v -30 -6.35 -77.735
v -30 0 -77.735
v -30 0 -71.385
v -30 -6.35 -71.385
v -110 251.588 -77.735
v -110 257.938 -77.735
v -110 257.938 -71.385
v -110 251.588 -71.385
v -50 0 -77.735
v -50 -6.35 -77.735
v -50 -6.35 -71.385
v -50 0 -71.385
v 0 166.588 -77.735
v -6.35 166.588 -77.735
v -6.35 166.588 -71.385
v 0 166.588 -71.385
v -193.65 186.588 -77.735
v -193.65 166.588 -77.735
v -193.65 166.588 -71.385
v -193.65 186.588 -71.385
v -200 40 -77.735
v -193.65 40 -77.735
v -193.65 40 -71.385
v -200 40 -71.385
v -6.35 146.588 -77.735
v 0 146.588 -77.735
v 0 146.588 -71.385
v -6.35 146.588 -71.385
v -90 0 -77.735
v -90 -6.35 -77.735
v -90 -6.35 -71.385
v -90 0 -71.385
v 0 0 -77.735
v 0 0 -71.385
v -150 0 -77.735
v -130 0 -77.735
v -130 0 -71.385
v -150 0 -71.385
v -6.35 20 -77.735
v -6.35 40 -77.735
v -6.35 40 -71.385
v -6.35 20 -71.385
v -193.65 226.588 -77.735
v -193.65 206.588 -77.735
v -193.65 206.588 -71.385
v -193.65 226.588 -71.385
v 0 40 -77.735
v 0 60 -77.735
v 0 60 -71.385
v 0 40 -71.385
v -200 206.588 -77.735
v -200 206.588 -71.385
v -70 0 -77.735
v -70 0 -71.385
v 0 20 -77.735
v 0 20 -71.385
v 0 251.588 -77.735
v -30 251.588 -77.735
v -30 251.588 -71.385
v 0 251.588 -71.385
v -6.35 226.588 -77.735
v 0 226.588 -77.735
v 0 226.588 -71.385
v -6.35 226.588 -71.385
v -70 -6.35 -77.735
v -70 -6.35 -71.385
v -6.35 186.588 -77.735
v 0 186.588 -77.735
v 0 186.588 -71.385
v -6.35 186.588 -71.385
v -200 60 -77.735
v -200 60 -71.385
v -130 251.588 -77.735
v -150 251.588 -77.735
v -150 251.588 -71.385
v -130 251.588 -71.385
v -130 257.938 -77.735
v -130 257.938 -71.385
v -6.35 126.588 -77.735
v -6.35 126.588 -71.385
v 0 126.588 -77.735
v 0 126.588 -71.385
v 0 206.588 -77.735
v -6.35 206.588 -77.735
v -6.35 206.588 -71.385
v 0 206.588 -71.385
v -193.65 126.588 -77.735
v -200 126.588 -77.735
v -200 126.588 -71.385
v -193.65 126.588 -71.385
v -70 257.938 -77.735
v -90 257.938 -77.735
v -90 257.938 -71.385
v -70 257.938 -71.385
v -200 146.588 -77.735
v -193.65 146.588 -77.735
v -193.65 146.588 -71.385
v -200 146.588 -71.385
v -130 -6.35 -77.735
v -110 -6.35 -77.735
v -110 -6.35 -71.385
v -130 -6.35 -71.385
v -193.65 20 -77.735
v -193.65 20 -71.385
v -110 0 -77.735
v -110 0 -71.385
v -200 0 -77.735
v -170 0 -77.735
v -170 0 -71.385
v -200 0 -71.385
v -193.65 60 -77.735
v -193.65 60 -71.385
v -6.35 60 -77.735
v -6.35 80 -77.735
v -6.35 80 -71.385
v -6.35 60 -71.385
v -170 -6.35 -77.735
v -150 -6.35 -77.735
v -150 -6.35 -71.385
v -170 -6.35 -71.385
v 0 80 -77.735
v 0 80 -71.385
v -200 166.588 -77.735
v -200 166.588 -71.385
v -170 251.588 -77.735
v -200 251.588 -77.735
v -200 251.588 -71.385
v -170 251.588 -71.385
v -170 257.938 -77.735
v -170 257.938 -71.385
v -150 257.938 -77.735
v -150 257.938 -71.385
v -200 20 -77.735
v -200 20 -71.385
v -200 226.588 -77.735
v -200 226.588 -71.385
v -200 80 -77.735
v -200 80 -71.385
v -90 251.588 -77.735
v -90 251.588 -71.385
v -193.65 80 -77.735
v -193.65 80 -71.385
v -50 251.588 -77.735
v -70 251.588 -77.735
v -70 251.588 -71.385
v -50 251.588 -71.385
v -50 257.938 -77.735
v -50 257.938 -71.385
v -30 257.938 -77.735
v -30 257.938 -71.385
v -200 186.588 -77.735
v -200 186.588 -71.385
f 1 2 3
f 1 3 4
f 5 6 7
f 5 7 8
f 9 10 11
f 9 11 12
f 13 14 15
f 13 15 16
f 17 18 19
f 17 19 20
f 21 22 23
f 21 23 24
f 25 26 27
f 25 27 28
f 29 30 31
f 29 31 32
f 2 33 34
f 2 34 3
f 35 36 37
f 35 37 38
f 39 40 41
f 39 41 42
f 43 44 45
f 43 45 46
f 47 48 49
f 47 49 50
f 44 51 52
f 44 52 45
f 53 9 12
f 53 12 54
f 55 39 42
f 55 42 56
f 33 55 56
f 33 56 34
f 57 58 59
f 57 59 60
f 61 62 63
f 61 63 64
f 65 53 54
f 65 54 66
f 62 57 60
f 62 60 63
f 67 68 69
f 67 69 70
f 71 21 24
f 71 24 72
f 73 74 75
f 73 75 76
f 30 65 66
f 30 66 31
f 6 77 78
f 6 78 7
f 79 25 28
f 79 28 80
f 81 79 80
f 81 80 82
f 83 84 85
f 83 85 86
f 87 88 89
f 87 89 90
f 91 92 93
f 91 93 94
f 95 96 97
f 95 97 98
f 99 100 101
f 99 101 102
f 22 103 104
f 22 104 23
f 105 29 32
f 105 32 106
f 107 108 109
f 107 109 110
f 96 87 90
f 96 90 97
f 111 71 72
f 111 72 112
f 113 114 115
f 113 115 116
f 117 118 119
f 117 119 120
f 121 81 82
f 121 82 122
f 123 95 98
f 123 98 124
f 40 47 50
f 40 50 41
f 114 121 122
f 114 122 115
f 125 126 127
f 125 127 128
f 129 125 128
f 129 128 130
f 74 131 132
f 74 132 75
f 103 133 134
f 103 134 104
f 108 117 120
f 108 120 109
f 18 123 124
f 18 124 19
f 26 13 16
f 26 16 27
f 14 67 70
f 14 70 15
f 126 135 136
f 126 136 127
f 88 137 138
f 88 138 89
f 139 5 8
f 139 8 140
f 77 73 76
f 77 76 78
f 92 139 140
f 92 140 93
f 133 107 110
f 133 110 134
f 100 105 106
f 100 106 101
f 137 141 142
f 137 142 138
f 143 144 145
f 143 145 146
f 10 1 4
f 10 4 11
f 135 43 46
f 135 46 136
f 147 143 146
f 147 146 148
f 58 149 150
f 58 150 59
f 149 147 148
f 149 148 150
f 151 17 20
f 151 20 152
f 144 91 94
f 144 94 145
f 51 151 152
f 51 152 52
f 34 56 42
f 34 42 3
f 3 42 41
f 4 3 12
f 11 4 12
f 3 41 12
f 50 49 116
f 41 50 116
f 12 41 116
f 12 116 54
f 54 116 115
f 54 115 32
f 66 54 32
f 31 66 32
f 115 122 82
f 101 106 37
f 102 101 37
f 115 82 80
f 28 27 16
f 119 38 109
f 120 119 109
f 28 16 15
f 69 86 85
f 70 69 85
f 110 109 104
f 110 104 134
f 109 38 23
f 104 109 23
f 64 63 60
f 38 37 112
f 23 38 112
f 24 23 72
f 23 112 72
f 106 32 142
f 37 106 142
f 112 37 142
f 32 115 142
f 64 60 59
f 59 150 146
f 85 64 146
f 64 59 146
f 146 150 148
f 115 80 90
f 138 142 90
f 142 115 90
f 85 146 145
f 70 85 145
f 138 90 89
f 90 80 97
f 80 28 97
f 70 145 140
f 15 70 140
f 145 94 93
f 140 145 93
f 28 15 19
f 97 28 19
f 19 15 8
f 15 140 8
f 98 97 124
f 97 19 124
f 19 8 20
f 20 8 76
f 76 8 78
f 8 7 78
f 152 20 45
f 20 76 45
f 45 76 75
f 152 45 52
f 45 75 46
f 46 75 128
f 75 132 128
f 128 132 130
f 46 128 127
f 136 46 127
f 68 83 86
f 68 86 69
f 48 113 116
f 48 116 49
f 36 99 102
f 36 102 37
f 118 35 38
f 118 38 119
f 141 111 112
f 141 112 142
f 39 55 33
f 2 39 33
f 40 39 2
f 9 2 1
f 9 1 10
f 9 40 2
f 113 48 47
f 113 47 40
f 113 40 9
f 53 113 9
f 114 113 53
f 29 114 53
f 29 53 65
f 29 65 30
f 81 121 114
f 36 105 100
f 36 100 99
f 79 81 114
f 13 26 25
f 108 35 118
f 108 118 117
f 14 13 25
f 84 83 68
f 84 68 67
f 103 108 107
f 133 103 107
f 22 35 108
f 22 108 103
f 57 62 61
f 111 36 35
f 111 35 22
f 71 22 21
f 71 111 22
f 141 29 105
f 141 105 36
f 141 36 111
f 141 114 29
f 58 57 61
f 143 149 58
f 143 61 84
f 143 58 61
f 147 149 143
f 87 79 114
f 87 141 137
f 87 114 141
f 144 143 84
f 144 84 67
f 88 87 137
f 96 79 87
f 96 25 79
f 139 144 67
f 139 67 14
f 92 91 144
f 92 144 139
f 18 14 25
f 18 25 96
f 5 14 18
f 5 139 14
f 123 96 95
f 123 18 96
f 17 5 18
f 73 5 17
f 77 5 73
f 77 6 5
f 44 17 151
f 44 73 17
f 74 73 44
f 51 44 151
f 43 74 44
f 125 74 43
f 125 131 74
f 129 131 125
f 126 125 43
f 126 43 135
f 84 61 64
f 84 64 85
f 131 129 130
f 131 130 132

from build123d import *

# Parameters (mm, degrees)
BOSS_EXTRUDE1_DEPTH = 6.35


with BuildPart() as part:
    # Sketch1 → Boss-Extrude1 (new body)
    with BuildSketch(Plane(origin=(0, 0, -77.734937154), x_dir=(-1, 0, 0), z_dir=(0, 0, -1))):
        Polygon((0, 80), (6.35, 80), (6.35, 60), (0, 60), (0, 40), (6.35, 40), (6.35, 20), (0, 20), (0, 0), (30, 0), (30, -6.35), (50, -6.35), (50, 0), (70, 0), (70, -6.35), (90, -6.35), (90, 0), (110, 0), (110, -6.35), (130, -6.35), (130, 0), (150, 0), (150, -6.35), (170, -6.35), (170, 0), (200, 0), (200, 20), (193.65, 20), (193.65, 40), (200, 40), (200, 60), (193.65, 60), (193.65, 80), (200, 80), (200, 126.5875), (193.65, 126.5875), (193.65, 146.5875), (200, 146.5875), (200, 166.5875), (193.65, 166.5875), (193.65, 186.5875), (200, 186.5875), (200, 206.5875), (193.65, 206.5875), (193.65, 226.5875), (200, 226.5875), (200, 251.5875), (170, 251.5875), (170, 257.9375), (150, 257.9375), (150, 251.5875), (130, 251.5875), (130, 257.9375), (110, 257.9375), (110, 251.5875), (90, 251.5875), (90, 257.9375), (70, 257.9375), (70, 251.5875), (50, 251.5875), (50, 257.9375), (30, 257.9375), (30, 251.5875), (0, 251.5875), (0, 226.5875), (6.35, 226.5875), (6.35, 206.5875), (0, 206.5875), (0, 186.5875), (6.35, 186.5875), (6.35, 166.5875), (0, 166.5875), (0, 146.5875), (6.35, 146.5875), (6.35, 126.5875), (0, 126.5875), align=None)
    extrude(amount=-BOSS_EXTRUDE1_DEPTH)


solid = part.part
